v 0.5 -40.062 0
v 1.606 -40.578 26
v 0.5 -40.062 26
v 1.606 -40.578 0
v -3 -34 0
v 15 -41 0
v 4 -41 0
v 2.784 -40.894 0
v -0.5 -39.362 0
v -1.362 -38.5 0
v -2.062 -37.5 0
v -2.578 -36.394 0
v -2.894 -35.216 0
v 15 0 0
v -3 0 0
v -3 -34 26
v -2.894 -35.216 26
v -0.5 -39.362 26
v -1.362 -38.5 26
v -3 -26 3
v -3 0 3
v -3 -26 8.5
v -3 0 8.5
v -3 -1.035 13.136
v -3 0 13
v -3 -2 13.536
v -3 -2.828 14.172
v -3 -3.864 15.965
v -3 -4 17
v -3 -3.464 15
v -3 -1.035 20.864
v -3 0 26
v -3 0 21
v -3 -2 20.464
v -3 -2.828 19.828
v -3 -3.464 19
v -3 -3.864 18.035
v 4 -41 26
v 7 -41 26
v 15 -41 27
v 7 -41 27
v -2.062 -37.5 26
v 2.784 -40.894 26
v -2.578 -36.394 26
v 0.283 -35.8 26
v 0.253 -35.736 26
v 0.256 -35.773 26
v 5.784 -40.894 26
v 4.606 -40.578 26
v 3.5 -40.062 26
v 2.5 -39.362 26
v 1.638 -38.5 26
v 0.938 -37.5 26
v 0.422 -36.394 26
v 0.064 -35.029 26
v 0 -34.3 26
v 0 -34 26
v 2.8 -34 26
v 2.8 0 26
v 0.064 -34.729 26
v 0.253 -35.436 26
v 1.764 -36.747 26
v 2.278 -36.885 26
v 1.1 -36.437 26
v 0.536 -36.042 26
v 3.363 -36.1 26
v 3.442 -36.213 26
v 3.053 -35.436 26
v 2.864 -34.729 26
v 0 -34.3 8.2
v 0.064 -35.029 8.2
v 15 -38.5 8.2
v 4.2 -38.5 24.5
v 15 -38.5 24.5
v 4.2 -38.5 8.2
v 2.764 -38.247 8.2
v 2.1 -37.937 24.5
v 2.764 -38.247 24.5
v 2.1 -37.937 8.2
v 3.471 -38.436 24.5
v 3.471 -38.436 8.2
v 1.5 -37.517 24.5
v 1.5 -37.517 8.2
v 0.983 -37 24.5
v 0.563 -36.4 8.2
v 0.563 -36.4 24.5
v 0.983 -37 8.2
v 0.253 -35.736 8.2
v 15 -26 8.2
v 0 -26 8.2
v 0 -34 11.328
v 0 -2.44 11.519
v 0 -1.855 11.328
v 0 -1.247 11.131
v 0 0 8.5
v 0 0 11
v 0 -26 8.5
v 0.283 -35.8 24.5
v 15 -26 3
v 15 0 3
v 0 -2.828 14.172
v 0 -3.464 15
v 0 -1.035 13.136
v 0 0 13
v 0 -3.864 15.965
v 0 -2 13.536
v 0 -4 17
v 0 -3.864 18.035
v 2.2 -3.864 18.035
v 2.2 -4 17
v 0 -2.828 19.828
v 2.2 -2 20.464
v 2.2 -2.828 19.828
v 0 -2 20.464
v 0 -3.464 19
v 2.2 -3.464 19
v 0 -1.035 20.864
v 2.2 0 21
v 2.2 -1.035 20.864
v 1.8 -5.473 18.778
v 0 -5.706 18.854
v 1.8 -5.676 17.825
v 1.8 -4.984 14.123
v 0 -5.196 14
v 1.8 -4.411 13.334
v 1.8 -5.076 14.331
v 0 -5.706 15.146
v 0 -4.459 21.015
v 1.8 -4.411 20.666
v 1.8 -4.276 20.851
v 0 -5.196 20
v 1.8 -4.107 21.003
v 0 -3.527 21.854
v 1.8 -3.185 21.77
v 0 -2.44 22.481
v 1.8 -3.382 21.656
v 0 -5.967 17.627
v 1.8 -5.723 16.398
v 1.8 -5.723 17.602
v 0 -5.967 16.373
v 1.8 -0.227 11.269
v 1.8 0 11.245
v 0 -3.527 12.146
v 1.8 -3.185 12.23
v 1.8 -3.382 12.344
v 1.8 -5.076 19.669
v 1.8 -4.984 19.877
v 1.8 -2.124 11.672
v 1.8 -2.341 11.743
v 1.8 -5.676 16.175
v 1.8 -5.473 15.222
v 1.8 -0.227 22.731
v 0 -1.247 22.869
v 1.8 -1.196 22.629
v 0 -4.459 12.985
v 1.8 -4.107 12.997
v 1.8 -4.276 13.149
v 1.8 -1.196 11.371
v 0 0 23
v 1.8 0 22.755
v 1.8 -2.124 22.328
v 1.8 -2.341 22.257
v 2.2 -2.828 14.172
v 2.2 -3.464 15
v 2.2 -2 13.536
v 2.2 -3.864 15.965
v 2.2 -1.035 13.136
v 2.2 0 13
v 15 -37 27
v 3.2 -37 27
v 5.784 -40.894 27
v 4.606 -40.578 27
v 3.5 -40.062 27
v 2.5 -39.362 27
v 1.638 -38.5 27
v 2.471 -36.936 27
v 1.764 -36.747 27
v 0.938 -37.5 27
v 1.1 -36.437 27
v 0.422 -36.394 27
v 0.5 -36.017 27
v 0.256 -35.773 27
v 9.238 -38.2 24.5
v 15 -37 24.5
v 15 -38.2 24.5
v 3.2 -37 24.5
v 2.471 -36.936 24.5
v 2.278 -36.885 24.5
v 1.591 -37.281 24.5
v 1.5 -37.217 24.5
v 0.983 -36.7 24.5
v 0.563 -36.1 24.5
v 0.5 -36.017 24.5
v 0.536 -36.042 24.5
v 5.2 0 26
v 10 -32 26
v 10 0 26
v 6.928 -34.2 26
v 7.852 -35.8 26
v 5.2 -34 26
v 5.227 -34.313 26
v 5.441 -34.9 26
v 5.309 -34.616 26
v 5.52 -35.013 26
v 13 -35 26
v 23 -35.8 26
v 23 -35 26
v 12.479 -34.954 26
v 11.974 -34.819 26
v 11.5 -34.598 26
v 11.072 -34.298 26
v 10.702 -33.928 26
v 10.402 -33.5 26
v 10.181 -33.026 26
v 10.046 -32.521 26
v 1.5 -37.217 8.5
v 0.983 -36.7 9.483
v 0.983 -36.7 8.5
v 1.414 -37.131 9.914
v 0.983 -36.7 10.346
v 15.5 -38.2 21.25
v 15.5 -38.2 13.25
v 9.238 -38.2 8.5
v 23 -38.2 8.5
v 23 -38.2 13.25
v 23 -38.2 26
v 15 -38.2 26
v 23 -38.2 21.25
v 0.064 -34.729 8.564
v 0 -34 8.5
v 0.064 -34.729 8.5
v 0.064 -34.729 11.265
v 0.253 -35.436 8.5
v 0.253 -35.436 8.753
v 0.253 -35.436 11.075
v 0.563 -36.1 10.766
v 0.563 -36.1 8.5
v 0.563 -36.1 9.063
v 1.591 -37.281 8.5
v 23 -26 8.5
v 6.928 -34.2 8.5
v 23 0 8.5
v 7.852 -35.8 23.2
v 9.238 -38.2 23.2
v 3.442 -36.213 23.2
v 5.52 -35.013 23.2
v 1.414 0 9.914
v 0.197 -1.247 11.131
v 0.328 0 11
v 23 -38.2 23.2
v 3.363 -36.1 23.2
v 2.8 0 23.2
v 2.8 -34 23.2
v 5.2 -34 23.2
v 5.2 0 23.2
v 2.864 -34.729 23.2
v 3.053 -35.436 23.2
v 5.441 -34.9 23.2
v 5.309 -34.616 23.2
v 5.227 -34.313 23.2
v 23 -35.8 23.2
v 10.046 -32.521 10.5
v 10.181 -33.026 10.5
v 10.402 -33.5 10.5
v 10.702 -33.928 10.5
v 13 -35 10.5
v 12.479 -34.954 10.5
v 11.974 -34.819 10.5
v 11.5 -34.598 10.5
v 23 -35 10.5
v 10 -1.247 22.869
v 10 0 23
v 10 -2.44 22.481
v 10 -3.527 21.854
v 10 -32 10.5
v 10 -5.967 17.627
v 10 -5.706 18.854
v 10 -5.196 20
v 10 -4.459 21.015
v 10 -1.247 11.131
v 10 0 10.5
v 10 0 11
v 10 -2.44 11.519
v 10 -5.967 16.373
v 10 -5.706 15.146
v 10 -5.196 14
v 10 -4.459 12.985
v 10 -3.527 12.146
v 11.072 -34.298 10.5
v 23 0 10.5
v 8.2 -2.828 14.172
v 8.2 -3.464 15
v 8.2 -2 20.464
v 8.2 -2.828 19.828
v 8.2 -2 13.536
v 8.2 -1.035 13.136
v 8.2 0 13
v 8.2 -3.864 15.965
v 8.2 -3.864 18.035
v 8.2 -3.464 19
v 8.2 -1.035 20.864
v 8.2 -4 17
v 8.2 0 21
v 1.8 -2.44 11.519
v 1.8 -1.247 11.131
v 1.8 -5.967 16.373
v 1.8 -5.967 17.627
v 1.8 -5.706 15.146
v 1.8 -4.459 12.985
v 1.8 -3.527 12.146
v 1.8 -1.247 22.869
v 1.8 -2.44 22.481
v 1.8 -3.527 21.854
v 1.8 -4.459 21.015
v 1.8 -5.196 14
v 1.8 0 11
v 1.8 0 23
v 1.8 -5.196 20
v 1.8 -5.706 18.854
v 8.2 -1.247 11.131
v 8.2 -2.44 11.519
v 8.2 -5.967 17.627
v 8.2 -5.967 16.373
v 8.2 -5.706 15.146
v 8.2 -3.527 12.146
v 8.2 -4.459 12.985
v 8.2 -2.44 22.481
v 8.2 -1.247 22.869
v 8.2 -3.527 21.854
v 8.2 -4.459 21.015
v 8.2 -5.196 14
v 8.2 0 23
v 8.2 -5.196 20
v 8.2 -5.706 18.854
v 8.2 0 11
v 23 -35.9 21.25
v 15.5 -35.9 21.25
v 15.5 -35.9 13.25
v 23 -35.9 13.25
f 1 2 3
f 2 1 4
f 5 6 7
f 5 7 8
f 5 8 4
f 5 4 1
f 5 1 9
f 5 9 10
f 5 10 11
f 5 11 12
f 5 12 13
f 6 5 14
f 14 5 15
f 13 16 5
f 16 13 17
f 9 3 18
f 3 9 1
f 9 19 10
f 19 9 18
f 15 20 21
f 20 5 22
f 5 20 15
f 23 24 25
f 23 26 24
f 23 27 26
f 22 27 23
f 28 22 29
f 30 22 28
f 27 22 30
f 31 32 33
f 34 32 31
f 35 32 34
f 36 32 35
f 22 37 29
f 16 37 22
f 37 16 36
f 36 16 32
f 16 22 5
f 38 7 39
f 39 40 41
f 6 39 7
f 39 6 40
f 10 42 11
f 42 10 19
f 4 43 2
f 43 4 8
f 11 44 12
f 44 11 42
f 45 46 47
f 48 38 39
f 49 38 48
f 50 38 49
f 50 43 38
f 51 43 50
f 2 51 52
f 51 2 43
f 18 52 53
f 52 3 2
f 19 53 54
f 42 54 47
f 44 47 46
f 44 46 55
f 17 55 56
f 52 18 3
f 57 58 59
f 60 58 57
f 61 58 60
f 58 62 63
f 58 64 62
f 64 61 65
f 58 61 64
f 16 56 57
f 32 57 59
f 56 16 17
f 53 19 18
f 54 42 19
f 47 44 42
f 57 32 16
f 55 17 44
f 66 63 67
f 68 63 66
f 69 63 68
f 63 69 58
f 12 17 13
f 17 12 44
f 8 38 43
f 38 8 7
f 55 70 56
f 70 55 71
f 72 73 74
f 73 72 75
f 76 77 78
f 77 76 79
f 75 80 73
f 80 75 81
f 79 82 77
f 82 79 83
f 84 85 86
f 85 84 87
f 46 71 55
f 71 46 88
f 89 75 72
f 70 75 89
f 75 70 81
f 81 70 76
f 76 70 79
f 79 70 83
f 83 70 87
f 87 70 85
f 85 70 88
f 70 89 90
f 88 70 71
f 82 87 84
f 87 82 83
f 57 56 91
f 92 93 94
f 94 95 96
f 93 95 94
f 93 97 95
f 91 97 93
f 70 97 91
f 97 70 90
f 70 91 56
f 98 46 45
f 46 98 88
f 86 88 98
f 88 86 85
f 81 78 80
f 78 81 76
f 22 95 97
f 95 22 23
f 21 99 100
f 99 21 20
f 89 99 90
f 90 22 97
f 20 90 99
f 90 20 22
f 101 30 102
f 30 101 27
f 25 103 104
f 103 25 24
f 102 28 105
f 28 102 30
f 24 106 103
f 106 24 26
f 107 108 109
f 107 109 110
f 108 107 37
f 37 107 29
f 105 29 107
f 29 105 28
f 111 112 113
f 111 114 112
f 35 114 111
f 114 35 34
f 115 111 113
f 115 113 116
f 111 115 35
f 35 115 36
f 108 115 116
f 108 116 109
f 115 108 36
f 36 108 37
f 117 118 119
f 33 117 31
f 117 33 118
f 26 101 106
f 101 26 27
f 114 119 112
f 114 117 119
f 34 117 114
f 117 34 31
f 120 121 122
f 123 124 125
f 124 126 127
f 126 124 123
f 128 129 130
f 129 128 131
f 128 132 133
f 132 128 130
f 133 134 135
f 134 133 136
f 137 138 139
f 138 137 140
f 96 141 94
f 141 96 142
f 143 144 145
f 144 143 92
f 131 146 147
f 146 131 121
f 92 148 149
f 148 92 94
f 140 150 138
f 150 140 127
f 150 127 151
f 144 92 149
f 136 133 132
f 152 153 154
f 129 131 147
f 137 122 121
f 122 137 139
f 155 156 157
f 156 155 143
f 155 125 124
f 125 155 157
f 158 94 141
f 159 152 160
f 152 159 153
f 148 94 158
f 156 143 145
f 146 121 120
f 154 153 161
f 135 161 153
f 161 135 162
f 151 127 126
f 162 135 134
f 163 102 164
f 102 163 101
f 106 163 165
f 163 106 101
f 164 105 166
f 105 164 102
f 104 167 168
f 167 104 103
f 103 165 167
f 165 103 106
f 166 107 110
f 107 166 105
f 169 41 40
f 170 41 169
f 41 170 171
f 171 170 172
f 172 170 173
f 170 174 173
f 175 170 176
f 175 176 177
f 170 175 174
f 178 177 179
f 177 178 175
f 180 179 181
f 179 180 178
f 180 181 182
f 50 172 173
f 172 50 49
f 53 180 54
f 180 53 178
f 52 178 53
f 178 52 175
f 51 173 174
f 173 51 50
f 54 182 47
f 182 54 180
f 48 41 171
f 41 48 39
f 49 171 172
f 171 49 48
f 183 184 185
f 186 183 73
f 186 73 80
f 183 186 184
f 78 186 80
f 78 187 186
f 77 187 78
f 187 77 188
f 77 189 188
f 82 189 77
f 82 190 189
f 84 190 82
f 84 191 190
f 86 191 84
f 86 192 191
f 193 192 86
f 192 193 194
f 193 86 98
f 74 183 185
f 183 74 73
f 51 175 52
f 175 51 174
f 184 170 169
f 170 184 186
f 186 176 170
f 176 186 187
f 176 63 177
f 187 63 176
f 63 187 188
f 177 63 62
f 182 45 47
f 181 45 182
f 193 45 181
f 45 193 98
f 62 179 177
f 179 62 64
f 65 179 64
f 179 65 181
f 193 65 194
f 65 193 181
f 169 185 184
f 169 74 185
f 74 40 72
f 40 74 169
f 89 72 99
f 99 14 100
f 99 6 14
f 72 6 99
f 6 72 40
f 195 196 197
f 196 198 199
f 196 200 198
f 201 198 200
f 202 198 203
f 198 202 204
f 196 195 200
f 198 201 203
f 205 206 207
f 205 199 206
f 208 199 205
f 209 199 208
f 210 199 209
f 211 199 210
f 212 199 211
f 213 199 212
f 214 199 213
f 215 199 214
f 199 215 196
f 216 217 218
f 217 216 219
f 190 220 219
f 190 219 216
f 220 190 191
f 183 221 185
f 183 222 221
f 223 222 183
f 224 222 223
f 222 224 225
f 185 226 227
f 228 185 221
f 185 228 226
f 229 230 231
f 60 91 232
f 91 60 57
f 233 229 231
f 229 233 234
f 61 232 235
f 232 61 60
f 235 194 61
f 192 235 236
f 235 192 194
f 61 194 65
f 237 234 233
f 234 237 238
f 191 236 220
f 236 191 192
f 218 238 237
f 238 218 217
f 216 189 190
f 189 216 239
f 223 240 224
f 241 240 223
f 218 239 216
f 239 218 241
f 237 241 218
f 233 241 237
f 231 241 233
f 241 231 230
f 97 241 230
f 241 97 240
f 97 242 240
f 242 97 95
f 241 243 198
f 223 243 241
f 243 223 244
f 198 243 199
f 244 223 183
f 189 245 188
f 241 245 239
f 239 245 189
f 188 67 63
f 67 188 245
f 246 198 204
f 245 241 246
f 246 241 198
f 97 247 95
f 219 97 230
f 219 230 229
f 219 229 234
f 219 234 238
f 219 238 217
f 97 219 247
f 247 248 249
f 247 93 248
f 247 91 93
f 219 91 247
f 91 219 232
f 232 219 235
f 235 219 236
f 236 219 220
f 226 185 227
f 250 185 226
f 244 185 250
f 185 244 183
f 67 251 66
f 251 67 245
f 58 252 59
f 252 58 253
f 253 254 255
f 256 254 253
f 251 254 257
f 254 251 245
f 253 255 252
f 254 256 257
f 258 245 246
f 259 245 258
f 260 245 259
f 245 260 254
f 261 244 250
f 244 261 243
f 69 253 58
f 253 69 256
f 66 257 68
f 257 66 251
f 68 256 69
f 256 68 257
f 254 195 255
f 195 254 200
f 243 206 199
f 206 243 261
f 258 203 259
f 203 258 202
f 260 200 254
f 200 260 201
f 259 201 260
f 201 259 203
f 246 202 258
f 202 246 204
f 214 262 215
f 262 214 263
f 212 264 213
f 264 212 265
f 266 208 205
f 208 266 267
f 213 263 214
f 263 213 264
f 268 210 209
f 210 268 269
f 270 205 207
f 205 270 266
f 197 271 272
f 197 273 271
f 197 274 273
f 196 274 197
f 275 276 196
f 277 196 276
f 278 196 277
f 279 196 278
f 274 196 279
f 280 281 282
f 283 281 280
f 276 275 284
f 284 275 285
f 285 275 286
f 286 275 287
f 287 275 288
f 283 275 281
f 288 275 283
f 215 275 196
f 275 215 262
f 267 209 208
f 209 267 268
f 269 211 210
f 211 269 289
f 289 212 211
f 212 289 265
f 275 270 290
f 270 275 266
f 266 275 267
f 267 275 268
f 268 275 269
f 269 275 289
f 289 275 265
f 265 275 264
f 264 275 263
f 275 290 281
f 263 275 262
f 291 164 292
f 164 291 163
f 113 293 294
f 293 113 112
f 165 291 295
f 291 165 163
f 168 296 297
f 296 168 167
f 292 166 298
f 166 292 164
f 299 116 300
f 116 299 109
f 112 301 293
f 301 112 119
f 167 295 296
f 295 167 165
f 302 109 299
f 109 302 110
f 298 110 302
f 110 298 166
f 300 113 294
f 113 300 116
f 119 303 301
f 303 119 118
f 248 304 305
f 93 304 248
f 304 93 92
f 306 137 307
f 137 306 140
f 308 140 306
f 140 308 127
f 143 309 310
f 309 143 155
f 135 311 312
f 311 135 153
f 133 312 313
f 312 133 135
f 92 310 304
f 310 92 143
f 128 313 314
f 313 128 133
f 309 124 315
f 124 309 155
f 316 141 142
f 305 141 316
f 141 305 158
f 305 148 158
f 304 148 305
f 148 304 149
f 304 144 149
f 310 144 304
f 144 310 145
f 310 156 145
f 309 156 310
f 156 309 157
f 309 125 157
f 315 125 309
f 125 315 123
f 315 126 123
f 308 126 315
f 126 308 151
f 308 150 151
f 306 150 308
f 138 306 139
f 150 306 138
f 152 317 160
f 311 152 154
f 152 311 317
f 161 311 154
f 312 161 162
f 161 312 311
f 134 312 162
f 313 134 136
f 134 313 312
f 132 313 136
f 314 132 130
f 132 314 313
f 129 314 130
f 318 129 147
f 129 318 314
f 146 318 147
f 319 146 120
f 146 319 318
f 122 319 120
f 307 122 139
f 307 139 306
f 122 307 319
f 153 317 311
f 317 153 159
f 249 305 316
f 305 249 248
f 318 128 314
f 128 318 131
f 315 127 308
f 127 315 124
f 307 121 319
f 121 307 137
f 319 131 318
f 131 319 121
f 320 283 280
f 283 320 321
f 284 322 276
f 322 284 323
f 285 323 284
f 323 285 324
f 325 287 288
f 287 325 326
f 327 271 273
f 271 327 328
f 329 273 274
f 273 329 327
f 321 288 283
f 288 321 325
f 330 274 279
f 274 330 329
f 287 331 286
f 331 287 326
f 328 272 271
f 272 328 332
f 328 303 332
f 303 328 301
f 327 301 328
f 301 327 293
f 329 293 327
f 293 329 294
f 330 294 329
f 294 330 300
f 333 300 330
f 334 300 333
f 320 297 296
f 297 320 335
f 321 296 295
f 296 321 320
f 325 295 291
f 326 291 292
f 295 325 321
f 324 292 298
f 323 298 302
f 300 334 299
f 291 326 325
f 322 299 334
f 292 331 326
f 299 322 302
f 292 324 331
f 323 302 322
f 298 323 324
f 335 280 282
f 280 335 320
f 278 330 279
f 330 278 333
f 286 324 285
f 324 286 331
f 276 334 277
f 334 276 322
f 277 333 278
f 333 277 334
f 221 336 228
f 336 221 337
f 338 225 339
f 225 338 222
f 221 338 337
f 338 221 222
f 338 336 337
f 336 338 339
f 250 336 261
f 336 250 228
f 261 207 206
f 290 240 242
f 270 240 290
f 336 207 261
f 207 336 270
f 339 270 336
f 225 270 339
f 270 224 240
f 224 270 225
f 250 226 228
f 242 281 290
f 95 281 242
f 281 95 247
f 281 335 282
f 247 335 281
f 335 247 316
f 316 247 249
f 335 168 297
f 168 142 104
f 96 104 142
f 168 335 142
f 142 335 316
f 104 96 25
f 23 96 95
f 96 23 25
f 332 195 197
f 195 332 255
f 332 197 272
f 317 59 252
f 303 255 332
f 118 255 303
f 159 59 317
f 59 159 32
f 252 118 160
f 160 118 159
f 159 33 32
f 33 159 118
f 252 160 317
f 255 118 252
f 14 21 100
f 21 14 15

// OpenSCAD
caller_part = "none";
include <collar_halter_v2.scad>;

// Macro view of socket back wall and entering pod tongue
// Cut in half along Y so we see the cylindrical boss entering the counterbore
difference() {
    union() {
        // Socket coupon
        intersection() {
            tpu_socket();
            translate([-15, -45, 0]) cube([30, 90, 30]);
        }
        
        // Pod tongue entered 1.8mm into the socket (mating position)
        translate([0, -pod_w/2, 0])
            intersection() {
                pod_right_base();
                translate([-2, -5, 0]) cube([25, 95, 30]);
            }

        // Cable harness
        %color([0.15, 0.15, 0.18], 0.7)
            translate([-12, 0, conduit_z])
                rotate([0, 90, 0]) cylinder(r=3.5, h=30, $fn=24);
    }
    
    // Cut away Y > 0 to see cross section
    translate([-30, 0, -10])
        cube([60, 60, 50]);
}
